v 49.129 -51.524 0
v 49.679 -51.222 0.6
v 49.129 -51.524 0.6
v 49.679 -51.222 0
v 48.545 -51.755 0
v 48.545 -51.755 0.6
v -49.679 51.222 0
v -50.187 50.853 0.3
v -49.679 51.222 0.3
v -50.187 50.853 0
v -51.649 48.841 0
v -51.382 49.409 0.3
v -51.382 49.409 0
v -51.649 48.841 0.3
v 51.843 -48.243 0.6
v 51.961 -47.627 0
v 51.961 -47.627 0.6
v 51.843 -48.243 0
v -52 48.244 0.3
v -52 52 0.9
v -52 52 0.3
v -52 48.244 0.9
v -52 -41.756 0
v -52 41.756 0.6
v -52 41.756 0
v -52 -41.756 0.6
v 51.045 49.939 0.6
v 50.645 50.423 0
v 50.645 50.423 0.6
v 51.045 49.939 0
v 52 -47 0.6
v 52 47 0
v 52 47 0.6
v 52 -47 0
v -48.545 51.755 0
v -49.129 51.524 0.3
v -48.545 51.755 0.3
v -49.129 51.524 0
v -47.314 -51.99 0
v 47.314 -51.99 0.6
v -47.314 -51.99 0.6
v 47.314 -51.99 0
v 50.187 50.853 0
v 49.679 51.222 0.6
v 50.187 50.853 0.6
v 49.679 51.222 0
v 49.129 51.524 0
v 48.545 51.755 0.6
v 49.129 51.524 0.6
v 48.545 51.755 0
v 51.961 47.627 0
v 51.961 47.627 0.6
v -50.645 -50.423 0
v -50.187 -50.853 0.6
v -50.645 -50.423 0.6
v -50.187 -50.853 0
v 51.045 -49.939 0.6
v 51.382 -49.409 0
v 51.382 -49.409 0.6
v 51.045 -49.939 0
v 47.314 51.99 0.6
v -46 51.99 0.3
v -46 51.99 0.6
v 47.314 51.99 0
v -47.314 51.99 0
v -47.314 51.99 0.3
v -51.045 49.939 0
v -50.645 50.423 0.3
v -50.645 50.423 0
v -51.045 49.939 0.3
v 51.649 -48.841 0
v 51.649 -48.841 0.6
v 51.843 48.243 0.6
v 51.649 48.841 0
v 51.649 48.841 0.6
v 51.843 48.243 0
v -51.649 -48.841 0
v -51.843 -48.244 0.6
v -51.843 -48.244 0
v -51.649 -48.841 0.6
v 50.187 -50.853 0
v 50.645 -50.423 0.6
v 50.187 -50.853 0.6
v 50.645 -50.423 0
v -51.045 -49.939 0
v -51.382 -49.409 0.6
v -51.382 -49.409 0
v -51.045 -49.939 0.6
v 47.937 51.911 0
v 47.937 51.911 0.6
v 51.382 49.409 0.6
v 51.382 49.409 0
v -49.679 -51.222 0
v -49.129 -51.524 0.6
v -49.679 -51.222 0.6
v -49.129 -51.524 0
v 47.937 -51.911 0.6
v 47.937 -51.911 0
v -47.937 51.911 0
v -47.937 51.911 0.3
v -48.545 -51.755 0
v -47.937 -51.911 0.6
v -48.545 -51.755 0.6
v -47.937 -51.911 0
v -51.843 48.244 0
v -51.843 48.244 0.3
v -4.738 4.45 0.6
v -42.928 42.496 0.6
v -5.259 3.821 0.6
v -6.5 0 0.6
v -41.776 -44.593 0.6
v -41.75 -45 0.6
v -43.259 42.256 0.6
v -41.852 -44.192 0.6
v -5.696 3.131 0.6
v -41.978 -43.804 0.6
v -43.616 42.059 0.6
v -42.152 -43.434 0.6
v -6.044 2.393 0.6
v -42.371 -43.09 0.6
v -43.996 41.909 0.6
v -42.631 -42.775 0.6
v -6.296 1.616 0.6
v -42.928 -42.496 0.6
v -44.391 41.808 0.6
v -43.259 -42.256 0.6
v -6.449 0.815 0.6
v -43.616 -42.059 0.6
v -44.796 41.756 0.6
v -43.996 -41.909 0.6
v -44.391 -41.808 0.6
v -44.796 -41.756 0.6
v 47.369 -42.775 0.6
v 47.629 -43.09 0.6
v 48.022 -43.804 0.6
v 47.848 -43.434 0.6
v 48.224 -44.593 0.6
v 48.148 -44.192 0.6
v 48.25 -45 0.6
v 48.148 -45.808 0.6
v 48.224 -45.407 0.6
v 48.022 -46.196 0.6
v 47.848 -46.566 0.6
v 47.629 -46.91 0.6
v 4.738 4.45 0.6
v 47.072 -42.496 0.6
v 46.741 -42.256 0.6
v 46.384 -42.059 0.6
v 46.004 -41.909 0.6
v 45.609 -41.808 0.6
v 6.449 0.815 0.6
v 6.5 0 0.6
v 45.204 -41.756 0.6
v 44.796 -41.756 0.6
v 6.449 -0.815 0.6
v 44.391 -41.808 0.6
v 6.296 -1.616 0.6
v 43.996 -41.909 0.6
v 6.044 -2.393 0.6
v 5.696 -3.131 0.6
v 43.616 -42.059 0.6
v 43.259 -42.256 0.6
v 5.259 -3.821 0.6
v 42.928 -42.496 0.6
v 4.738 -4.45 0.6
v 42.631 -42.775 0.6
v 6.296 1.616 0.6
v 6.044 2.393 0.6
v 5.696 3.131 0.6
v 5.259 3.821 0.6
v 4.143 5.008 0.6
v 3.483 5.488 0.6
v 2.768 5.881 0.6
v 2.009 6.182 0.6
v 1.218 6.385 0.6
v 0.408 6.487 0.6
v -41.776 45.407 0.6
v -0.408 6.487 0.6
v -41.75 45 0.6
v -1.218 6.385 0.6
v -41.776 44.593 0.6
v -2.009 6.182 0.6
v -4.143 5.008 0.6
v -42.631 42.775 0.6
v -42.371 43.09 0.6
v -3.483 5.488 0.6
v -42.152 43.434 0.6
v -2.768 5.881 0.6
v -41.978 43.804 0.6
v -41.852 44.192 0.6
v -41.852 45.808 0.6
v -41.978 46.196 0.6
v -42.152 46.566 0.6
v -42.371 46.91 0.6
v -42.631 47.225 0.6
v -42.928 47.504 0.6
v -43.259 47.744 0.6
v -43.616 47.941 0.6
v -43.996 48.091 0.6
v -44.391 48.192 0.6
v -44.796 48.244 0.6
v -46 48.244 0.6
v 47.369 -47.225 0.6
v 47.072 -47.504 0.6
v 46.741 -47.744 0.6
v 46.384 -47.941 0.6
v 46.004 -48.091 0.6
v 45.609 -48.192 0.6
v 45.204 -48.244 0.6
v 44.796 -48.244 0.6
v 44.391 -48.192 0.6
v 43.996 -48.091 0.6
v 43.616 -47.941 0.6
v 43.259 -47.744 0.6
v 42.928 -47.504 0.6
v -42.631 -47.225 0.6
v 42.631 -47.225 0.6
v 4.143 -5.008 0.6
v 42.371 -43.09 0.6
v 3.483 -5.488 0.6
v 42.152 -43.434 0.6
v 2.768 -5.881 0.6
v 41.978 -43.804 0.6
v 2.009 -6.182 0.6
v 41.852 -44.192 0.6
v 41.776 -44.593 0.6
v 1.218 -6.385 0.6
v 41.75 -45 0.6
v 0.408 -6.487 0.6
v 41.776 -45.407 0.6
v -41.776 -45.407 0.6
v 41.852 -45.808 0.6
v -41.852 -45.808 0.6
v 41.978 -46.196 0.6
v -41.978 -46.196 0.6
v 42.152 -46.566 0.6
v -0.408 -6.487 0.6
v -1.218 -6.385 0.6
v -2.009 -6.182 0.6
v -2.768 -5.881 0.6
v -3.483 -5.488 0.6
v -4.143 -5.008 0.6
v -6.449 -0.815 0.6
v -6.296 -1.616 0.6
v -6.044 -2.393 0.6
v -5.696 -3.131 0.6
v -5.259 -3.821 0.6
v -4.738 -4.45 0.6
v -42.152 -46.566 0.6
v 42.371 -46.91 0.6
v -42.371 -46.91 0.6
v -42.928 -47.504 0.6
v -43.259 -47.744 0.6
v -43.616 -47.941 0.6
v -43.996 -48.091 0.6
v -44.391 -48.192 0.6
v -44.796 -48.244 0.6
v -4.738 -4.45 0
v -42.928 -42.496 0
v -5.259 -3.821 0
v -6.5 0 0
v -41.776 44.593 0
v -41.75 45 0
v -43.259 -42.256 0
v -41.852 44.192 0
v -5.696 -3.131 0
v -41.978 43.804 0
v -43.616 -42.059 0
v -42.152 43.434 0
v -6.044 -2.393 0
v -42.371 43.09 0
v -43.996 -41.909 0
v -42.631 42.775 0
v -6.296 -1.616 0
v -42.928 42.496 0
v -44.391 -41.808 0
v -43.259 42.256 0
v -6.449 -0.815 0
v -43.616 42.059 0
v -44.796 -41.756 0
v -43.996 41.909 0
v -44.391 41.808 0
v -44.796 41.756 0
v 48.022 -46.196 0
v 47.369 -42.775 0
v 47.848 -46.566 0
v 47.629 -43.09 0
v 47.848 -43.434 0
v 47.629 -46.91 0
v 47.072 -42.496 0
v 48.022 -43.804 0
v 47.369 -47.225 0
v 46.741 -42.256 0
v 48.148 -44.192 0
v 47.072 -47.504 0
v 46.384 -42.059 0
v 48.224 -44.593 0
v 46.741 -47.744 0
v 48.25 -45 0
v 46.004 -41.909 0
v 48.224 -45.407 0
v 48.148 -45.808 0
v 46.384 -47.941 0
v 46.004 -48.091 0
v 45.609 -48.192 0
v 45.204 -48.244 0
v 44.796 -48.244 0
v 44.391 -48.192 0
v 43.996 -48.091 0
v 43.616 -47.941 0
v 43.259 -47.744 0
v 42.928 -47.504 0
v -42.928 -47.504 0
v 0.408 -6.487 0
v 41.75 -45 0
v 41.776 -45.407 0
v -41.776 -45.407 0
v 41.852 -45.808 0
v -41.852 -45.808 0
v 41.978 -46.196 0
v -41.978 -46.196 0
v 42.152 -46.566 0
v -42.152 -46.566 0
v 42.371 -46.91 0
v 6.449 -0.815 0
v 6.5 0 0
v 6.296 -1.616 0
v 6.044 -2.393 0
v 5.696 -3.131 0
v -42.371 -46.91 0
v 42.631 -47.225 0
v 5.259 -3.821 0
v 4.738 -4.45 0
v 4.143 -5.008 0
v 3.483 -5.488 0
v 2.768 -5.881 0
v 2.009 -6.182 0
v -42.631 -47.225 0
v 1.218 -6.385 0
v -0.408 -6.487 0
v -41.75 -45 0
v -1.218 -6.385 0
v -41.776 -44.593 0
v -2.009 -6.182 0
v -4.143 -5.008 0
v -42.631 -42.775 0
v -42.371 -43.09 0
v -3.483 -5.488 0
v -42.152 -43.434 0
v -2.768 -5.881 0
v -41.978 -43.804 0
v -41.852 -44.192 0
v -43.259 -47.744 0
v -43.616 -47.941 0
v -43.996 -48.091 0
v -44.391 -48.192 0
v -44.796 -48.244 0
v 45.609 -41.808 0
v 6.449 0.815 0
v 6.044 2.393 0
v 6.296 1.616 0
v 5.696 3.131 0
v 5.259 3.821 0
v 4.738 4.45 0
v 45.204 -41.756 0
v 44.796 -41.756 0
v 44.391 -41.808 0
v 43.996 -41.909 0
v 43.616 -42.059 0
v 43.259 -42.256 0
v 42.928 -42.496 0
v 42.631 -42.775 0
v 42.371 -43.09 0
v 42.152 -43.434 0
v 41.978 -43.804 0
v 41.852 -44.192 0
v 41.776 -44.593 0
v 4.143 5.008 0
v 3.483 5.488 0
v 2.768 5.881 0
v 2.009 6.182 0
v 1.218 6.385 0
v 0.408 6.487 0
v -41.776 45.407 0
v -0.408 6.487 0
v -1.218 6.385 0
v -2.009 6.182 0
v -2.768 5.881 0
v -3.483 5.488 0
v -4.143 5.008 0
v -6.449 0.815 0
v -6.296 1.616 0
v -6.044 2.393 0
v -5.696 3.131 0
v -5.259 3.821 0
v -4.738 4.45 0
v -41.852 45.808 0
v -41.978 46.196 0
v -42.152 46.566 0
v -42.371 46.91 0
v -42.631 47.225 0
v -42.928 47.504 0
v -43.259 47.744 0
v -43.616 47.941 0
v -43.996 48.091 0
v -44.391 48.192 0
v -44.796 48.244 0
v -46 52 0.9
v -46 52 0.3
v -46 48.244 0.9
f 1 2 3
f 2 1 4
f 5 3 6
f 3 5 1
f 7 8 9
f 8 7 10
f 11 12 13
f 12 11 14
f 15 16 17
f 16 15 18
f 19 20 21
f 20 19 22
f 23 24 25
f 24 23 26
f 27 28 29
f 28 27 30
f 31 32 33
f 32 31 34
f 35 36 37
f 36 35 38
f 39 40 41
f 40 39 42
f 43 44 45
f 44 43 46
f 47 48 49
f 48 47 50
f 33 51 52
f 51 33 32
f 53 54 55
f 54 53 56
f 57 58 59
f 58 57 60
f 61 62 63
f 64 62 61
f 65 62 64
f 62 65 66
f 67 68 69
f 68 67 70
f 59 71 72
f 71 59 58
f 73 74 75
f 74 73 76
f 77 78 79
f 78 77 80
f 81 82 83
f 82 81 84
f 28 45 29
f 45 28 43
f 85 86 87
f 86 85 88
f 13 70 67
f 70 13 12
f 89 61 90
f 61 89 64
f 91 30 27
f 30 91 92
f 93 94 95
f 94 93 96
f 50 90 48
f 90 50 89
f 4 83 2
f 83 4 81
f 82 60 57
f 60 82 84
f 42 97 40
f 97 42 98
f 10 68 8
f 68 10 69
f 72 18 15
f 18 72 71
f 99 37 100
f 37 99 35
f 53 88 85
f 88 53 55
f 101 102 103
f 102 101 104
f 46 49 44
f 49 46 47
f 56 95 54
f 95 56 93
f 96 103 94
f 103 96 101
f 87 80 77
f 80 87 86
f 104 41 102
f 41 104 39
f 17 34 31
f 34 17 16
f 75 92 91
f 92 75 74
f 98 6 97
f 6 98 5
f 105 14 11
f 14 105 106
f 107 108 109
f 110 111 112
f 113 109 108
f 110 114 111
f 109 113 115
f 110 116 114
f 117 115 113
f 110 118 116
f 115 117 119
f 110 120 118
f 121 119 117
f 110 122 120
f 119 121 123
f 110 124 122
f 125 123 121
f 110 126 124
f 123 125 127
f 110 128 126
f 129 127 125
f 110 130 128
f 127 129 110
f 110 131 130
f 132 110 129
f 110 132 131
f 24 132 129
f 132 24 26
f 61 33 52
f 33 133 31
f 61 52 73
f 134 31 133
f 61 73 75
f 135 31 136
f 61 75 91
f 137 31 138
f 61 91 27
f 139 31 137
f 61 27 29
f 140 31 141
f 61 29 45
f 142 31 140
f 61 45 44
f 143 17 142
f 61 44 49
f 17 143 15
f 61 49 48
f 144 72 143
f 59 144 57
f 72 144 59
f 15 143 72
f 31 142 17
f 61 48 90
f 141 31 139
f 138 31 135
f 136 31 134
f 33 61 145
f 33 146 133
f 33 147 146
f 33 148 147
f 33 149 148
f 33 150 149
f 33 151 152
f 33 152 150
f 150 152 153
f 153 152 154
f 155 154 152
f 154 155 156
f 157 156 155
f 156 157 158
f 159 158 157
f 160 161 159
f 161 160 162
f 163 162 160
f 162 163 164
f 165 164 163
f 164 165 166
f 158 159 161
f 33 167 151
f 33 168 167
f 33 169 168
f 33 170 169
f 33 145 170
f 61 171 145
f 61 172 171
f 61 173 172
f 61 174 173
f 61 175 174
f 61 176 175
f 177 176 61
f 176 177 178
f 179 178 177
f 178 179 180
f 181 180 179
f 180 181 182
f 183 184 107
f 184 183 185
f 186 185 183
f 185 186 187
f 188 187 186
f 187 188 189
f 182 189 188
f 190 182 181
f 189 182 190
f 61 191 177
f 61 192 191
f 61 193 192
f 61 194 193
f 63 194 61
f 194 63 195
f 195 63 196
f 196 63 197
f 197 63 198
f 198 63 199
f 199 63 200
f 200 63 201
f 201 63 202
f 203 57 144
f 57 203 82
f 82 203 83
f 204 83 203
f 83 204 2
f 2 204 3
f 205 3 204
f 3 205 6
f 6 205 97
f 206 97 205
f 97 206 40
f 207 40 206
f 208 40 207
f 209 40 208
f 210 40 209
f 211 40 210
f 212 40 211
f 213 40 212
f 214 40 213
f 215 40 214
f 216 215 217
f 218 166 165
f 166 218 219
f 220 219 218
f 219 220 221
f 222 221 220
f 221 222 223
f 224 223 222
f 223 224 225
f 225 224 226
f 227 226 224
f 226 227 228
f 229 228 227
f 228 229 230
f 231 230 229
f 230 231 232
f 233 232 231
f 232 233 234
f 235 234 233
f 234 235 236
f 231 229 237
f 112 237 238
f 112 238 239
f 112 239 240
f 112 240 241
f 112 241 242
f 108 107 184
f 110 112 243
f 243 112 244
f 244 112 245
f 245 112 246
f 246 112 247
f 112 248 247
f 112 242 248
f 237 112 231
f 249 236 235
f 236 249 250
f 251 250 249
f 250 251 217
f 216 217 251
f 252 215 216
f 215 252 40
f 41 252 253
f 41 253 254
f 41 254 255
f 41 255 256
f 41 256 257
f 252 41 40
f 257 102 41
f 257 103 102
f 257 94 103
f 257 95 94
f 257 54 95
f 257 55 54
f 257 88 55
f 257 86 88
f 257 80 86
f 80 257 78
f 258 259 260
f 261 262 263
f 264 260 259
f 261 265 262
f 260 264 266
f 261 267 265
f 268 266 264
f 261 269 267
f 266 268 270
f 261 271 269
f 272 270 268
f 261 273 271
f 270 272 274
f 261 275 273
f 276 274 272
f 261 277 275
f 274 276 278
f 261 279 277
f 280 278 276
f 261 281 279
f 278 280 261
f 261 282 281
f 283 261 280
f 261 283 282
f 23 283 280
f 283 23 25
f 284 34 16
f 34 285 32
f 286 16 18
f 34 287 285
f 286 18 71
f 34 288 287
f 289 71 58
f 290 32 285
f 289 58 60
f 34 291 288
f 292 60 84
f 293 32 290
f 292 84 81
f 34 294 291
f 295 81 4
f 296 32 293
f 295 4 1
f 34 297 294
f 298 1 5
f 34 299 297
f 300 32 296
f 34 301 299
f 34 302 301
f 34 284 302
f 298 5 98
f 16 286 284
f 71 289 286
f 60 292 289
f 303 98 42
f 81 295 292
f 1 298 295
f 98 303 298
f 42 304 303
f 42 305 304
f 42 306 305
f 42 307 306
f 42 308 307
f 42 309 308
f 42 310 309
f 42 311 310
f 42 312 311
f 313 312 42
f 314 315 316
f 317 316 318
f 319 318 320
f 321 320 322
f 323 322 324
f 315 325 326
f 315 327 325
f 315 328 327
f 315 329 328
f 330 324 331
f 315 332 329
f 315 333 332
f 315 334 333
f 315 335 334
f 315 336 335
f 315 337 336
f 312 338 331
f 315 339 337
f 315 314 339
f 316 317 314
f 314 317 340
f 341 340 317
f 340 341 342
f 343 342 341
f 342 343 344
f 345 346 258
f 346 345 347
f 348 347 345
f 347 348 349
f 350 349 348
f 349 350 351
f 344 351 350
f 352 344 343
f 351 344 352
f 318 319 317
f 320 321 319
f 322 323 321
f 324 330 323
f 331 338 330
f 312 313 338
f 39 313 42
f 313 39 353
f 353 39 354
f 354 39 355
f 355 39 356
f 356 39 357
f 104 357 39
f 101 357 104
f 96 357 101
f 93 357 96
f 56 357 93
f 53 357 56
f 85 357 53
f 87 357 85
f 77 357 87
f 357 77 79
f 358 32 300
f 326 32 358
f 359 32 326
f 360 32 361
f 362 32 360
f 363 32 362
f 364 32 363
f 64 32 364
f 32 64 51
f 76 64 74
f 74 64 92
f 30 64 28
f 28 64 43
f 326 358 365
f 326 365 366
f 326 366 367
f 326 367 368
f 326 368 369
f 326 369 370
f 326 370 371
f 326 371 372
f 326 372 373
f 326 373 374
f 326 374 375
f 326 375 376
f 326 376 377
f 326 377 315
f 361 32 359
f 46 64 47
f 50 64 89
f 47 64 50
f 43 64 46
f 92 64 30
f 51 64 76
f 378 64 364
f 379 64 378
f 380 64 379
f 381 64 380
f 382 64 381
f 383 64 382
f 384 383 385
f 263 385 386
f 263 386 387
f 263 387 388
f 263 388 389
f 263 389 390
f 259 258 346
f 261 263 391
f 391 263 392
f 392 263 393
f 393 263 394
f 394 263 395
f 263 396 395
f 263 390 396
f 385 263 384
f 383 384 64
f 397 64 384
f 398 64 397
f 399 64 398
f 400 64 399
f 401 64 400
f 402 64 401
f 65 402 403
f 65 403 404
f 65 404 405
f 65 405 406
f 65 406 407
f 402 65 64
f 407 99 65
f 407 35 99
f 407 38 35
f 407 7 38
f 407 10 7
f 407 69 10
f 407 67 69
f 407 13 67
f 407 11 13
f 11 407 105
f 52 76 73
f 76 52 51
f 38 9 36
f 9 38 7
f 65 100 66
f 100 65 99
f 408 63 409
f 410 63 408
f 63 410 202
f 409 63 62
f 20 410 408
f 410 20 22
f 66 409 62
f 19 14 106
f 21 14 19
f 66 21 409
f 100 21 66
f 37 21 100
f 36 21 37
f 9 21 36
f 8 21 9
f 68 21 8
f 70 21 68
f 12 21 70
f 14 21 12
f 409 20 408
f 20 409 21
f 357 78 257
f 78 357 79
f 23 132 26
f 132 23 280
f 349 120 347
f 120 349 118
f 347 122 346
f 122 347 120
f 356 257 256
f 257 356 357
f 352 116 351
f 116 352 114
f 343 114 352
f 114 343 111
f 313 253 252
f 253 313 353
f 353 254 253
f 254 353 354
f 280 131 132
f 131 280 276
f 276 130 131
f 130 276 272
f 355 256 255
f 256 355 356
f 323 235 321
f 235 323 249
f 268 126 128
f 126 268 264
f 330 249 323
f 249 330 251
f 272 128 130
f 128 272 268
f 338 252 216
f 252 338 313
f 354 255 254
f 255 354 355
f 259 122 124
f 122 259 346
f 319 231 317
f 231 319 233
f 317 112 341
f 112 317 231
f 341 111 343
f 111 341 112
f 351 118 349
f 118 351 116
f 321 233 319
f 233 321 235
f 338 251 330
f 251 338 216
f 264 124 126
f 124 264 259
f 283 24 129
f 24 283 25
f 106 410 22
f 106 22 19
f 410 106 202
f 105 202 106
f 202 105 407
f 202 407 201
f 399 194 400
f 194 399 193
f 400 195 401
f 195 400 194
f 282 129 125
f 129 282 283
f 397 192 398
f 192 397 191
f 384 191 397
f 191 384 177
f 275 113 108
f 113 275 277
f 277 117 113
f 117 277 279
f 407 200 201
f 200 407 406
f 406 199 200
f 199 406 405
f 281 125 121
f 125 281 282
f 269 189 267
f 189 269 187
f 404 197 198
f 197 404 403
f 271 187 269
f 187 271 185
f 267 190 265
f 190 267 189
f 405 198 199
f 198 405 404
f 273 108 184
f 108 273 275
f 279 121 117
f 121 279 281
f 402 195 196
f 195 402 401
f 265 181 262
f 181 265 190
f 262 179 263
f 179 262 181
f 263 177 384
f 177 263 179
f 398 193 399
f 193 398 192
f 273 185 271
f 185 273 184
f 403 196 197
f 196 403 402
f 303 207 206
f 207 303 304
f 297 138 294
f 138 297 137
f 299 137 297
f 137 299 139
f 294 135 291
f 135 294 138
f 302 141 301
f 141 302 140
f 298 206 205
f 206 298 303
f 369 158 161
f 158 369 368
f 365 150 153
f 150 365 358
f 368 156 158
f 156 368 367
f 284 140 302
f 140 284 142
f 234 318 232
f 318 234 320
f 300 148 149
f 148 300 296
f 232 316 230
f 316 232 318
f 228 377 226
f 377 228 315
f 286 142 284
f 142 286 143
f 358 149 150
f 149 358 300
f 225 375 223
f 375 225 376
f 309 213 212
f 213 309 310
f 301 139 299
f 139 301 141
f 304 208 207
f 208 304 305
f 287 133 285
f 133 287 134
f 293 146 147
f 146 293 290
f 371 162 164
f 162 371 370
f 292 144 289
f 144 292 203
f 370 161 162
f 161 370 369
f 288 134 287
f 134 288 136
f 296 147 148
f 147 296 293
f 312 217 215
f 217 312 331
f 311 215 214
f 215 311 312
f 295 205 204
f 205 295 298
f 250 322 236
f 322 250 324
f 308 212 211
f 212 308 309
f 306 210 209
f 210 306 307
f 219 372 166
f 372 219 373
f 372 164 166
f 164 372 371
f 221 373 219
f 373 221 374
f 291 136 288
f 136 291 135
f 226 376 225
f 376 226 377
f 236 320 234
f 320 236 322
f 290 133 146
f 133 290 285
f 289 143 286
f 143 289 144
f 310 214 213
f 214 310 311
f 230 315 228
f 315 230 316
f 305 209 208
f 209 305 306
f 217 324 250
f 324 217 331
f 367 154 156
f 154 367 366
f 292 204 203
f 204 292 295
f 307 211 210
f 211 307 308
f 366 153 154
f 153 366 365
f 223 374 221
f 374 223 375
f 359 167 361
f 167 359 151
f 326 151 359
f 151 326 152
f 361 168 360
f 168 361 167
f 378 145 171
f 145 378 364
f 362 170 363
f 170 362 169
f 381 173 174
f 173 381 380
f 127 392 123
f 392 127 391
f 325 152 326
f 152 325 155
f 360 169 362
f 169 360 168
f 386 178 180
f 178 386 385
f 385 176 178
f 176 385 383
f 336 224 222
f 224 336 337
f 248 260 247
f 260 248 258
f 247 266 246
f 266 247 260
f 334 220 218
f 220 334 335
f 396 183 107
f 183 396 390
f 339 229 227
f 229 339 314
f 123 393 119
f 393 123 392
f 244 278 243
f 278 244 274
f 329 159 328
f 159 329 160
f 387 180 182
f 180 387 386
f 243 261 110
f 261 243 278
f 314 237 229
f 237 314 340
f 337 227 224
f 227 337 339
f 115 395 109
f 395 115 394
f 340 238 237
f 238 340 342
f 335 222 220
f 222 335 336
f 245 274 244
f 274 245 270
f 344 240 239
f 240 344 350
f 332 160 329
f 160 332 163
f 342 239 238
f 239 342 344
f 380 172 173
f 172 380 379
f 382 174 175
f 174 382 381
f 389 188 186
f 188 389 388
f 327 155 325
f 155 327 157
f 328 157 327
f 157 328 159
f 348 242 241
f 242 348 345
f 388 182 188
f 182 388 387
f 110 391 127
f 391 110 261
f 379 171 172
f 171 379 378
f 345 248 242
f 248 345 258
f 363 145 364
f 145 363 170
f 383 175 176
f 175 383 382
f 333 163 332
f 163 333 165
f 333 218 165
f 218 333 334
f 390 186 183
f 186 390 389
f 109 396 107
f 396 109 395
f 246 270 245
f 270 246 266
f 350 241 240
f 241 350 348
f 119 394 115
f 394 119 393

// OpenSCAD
$fn = 50;


difference() {
	union() {
		translate(v = [0, 0, 0]) {
			rotate(a = [0, 0, 0]) {
				hull() {
					translate(v = [-47.0000000000, 47.0000000000, 0]) {
						rotate(a = [0, 0, 0]) {
							translate(v = [0, 0, 0]) {
								rotate(a = [0, 0, 0]) {
									cylinder(h = 0.6000000000, r = 5);
								}
							}
						}
					}
					translate(v = [47.0000000000, 47.0000000000, 0]) {
						rotate(a = [0, 0, 0]) {
							translate(v = [0, 0, 0]) {
								rotate(a = [0, 0, 0]) {
									cylinder(h = 0.6000000000, r = 5);
								}
							}
						}
					}
					translate(v = [-47.0000000000, -47.0000000000, 0]) {
						rotate(a = [0, 0, 0]) {
							translate(v = [0, 0, 0]) {
								rotate(a = [0, 0, 0]) {
									cylinder(h = 0.6000000000, r = 5);
								}
							}
						}
					}
					translate(v = [47.0000000000, -47.0000000000, 0]) {
						rotate(a = [0, 0, 0]) {
							translate(v = [0, 0, 0]) {
								rotate(a = [0, 0, 0]) {
									cylinder(h = 0.6000000000, r = 5);
								}
							}
						}
					}
				}
			}
		}
		#translate(v = [-52.0000000000, 46.0000000000, 0.3000000000]) {
			rotate(a = [0, 0, 0]) {
				cube(size = [6, 6, 0.6000000000]);
			}
		}
	}
	union() {
		translate(v = [-52.5000000000, -45.0000000000, -125]) {
			rotate(a = [0, 0, 0]) {
				hull() {
					translate(v = [7.5000000000, 0, 0]) {
						rotate(a = [0, 0, 0]) {
							translate(v = [0, 0, 0]) {
								rotate(a = [0, 0, 0]) {
									cylinder(h = 250, r = 3.2500000000);
								}
							}
						}
					}
					translate(v = [-7.5000000000, 0, 0]) {
						rotate(a = [0, 0, 0]) {
							translate(v = [0, 0, 0]) {
								rotate(a = [0, 0, 0]) {
									cylinder(h = 250, r = 3.2500000000);
								}
							}
						}
					}
				}
			}
		}
		translate(v = [-52.5000000000, 45.0000000000, -125]) {
			rotate(a = [0, 0, 0]) {
				hull() {
					translate(v = [7.5000000000, 0, 0]) {
						rotate(a = [0, 0, 0]) {
							translate(v = [0, 0, 0]) {
								rotate(a = [0, 0, 0]) {
									cylinder(h = 250, r = 3.2500000000);
								}
							}
						}
					}
					translate(v = [-7.5000000000, 0, 0]) {
						rotate(a = [0, 0, 0]) {
							translate(v = [0, 0, 0]) {
								rotate(a = [0, 0, 0]) {
									cylinder(h = 250, r = 3.2500000000);
								}
							}
						}
					}
				}
			}
		}
		translate(v = [45.0000000000, -45.0000000000, -125.0000000000]) {
			rotate(a = [0, 0, 0]) {
				cylinder(h = 250, r = 3.2500000000);
			}
		}
		translate(v = [0, 0, 0.0000000000]) {
			rotate(a = [0, 0, 0]) {
				cylinder(h = 0.6000000000, r = 6.5000000000);
			}
		}
	}
}
